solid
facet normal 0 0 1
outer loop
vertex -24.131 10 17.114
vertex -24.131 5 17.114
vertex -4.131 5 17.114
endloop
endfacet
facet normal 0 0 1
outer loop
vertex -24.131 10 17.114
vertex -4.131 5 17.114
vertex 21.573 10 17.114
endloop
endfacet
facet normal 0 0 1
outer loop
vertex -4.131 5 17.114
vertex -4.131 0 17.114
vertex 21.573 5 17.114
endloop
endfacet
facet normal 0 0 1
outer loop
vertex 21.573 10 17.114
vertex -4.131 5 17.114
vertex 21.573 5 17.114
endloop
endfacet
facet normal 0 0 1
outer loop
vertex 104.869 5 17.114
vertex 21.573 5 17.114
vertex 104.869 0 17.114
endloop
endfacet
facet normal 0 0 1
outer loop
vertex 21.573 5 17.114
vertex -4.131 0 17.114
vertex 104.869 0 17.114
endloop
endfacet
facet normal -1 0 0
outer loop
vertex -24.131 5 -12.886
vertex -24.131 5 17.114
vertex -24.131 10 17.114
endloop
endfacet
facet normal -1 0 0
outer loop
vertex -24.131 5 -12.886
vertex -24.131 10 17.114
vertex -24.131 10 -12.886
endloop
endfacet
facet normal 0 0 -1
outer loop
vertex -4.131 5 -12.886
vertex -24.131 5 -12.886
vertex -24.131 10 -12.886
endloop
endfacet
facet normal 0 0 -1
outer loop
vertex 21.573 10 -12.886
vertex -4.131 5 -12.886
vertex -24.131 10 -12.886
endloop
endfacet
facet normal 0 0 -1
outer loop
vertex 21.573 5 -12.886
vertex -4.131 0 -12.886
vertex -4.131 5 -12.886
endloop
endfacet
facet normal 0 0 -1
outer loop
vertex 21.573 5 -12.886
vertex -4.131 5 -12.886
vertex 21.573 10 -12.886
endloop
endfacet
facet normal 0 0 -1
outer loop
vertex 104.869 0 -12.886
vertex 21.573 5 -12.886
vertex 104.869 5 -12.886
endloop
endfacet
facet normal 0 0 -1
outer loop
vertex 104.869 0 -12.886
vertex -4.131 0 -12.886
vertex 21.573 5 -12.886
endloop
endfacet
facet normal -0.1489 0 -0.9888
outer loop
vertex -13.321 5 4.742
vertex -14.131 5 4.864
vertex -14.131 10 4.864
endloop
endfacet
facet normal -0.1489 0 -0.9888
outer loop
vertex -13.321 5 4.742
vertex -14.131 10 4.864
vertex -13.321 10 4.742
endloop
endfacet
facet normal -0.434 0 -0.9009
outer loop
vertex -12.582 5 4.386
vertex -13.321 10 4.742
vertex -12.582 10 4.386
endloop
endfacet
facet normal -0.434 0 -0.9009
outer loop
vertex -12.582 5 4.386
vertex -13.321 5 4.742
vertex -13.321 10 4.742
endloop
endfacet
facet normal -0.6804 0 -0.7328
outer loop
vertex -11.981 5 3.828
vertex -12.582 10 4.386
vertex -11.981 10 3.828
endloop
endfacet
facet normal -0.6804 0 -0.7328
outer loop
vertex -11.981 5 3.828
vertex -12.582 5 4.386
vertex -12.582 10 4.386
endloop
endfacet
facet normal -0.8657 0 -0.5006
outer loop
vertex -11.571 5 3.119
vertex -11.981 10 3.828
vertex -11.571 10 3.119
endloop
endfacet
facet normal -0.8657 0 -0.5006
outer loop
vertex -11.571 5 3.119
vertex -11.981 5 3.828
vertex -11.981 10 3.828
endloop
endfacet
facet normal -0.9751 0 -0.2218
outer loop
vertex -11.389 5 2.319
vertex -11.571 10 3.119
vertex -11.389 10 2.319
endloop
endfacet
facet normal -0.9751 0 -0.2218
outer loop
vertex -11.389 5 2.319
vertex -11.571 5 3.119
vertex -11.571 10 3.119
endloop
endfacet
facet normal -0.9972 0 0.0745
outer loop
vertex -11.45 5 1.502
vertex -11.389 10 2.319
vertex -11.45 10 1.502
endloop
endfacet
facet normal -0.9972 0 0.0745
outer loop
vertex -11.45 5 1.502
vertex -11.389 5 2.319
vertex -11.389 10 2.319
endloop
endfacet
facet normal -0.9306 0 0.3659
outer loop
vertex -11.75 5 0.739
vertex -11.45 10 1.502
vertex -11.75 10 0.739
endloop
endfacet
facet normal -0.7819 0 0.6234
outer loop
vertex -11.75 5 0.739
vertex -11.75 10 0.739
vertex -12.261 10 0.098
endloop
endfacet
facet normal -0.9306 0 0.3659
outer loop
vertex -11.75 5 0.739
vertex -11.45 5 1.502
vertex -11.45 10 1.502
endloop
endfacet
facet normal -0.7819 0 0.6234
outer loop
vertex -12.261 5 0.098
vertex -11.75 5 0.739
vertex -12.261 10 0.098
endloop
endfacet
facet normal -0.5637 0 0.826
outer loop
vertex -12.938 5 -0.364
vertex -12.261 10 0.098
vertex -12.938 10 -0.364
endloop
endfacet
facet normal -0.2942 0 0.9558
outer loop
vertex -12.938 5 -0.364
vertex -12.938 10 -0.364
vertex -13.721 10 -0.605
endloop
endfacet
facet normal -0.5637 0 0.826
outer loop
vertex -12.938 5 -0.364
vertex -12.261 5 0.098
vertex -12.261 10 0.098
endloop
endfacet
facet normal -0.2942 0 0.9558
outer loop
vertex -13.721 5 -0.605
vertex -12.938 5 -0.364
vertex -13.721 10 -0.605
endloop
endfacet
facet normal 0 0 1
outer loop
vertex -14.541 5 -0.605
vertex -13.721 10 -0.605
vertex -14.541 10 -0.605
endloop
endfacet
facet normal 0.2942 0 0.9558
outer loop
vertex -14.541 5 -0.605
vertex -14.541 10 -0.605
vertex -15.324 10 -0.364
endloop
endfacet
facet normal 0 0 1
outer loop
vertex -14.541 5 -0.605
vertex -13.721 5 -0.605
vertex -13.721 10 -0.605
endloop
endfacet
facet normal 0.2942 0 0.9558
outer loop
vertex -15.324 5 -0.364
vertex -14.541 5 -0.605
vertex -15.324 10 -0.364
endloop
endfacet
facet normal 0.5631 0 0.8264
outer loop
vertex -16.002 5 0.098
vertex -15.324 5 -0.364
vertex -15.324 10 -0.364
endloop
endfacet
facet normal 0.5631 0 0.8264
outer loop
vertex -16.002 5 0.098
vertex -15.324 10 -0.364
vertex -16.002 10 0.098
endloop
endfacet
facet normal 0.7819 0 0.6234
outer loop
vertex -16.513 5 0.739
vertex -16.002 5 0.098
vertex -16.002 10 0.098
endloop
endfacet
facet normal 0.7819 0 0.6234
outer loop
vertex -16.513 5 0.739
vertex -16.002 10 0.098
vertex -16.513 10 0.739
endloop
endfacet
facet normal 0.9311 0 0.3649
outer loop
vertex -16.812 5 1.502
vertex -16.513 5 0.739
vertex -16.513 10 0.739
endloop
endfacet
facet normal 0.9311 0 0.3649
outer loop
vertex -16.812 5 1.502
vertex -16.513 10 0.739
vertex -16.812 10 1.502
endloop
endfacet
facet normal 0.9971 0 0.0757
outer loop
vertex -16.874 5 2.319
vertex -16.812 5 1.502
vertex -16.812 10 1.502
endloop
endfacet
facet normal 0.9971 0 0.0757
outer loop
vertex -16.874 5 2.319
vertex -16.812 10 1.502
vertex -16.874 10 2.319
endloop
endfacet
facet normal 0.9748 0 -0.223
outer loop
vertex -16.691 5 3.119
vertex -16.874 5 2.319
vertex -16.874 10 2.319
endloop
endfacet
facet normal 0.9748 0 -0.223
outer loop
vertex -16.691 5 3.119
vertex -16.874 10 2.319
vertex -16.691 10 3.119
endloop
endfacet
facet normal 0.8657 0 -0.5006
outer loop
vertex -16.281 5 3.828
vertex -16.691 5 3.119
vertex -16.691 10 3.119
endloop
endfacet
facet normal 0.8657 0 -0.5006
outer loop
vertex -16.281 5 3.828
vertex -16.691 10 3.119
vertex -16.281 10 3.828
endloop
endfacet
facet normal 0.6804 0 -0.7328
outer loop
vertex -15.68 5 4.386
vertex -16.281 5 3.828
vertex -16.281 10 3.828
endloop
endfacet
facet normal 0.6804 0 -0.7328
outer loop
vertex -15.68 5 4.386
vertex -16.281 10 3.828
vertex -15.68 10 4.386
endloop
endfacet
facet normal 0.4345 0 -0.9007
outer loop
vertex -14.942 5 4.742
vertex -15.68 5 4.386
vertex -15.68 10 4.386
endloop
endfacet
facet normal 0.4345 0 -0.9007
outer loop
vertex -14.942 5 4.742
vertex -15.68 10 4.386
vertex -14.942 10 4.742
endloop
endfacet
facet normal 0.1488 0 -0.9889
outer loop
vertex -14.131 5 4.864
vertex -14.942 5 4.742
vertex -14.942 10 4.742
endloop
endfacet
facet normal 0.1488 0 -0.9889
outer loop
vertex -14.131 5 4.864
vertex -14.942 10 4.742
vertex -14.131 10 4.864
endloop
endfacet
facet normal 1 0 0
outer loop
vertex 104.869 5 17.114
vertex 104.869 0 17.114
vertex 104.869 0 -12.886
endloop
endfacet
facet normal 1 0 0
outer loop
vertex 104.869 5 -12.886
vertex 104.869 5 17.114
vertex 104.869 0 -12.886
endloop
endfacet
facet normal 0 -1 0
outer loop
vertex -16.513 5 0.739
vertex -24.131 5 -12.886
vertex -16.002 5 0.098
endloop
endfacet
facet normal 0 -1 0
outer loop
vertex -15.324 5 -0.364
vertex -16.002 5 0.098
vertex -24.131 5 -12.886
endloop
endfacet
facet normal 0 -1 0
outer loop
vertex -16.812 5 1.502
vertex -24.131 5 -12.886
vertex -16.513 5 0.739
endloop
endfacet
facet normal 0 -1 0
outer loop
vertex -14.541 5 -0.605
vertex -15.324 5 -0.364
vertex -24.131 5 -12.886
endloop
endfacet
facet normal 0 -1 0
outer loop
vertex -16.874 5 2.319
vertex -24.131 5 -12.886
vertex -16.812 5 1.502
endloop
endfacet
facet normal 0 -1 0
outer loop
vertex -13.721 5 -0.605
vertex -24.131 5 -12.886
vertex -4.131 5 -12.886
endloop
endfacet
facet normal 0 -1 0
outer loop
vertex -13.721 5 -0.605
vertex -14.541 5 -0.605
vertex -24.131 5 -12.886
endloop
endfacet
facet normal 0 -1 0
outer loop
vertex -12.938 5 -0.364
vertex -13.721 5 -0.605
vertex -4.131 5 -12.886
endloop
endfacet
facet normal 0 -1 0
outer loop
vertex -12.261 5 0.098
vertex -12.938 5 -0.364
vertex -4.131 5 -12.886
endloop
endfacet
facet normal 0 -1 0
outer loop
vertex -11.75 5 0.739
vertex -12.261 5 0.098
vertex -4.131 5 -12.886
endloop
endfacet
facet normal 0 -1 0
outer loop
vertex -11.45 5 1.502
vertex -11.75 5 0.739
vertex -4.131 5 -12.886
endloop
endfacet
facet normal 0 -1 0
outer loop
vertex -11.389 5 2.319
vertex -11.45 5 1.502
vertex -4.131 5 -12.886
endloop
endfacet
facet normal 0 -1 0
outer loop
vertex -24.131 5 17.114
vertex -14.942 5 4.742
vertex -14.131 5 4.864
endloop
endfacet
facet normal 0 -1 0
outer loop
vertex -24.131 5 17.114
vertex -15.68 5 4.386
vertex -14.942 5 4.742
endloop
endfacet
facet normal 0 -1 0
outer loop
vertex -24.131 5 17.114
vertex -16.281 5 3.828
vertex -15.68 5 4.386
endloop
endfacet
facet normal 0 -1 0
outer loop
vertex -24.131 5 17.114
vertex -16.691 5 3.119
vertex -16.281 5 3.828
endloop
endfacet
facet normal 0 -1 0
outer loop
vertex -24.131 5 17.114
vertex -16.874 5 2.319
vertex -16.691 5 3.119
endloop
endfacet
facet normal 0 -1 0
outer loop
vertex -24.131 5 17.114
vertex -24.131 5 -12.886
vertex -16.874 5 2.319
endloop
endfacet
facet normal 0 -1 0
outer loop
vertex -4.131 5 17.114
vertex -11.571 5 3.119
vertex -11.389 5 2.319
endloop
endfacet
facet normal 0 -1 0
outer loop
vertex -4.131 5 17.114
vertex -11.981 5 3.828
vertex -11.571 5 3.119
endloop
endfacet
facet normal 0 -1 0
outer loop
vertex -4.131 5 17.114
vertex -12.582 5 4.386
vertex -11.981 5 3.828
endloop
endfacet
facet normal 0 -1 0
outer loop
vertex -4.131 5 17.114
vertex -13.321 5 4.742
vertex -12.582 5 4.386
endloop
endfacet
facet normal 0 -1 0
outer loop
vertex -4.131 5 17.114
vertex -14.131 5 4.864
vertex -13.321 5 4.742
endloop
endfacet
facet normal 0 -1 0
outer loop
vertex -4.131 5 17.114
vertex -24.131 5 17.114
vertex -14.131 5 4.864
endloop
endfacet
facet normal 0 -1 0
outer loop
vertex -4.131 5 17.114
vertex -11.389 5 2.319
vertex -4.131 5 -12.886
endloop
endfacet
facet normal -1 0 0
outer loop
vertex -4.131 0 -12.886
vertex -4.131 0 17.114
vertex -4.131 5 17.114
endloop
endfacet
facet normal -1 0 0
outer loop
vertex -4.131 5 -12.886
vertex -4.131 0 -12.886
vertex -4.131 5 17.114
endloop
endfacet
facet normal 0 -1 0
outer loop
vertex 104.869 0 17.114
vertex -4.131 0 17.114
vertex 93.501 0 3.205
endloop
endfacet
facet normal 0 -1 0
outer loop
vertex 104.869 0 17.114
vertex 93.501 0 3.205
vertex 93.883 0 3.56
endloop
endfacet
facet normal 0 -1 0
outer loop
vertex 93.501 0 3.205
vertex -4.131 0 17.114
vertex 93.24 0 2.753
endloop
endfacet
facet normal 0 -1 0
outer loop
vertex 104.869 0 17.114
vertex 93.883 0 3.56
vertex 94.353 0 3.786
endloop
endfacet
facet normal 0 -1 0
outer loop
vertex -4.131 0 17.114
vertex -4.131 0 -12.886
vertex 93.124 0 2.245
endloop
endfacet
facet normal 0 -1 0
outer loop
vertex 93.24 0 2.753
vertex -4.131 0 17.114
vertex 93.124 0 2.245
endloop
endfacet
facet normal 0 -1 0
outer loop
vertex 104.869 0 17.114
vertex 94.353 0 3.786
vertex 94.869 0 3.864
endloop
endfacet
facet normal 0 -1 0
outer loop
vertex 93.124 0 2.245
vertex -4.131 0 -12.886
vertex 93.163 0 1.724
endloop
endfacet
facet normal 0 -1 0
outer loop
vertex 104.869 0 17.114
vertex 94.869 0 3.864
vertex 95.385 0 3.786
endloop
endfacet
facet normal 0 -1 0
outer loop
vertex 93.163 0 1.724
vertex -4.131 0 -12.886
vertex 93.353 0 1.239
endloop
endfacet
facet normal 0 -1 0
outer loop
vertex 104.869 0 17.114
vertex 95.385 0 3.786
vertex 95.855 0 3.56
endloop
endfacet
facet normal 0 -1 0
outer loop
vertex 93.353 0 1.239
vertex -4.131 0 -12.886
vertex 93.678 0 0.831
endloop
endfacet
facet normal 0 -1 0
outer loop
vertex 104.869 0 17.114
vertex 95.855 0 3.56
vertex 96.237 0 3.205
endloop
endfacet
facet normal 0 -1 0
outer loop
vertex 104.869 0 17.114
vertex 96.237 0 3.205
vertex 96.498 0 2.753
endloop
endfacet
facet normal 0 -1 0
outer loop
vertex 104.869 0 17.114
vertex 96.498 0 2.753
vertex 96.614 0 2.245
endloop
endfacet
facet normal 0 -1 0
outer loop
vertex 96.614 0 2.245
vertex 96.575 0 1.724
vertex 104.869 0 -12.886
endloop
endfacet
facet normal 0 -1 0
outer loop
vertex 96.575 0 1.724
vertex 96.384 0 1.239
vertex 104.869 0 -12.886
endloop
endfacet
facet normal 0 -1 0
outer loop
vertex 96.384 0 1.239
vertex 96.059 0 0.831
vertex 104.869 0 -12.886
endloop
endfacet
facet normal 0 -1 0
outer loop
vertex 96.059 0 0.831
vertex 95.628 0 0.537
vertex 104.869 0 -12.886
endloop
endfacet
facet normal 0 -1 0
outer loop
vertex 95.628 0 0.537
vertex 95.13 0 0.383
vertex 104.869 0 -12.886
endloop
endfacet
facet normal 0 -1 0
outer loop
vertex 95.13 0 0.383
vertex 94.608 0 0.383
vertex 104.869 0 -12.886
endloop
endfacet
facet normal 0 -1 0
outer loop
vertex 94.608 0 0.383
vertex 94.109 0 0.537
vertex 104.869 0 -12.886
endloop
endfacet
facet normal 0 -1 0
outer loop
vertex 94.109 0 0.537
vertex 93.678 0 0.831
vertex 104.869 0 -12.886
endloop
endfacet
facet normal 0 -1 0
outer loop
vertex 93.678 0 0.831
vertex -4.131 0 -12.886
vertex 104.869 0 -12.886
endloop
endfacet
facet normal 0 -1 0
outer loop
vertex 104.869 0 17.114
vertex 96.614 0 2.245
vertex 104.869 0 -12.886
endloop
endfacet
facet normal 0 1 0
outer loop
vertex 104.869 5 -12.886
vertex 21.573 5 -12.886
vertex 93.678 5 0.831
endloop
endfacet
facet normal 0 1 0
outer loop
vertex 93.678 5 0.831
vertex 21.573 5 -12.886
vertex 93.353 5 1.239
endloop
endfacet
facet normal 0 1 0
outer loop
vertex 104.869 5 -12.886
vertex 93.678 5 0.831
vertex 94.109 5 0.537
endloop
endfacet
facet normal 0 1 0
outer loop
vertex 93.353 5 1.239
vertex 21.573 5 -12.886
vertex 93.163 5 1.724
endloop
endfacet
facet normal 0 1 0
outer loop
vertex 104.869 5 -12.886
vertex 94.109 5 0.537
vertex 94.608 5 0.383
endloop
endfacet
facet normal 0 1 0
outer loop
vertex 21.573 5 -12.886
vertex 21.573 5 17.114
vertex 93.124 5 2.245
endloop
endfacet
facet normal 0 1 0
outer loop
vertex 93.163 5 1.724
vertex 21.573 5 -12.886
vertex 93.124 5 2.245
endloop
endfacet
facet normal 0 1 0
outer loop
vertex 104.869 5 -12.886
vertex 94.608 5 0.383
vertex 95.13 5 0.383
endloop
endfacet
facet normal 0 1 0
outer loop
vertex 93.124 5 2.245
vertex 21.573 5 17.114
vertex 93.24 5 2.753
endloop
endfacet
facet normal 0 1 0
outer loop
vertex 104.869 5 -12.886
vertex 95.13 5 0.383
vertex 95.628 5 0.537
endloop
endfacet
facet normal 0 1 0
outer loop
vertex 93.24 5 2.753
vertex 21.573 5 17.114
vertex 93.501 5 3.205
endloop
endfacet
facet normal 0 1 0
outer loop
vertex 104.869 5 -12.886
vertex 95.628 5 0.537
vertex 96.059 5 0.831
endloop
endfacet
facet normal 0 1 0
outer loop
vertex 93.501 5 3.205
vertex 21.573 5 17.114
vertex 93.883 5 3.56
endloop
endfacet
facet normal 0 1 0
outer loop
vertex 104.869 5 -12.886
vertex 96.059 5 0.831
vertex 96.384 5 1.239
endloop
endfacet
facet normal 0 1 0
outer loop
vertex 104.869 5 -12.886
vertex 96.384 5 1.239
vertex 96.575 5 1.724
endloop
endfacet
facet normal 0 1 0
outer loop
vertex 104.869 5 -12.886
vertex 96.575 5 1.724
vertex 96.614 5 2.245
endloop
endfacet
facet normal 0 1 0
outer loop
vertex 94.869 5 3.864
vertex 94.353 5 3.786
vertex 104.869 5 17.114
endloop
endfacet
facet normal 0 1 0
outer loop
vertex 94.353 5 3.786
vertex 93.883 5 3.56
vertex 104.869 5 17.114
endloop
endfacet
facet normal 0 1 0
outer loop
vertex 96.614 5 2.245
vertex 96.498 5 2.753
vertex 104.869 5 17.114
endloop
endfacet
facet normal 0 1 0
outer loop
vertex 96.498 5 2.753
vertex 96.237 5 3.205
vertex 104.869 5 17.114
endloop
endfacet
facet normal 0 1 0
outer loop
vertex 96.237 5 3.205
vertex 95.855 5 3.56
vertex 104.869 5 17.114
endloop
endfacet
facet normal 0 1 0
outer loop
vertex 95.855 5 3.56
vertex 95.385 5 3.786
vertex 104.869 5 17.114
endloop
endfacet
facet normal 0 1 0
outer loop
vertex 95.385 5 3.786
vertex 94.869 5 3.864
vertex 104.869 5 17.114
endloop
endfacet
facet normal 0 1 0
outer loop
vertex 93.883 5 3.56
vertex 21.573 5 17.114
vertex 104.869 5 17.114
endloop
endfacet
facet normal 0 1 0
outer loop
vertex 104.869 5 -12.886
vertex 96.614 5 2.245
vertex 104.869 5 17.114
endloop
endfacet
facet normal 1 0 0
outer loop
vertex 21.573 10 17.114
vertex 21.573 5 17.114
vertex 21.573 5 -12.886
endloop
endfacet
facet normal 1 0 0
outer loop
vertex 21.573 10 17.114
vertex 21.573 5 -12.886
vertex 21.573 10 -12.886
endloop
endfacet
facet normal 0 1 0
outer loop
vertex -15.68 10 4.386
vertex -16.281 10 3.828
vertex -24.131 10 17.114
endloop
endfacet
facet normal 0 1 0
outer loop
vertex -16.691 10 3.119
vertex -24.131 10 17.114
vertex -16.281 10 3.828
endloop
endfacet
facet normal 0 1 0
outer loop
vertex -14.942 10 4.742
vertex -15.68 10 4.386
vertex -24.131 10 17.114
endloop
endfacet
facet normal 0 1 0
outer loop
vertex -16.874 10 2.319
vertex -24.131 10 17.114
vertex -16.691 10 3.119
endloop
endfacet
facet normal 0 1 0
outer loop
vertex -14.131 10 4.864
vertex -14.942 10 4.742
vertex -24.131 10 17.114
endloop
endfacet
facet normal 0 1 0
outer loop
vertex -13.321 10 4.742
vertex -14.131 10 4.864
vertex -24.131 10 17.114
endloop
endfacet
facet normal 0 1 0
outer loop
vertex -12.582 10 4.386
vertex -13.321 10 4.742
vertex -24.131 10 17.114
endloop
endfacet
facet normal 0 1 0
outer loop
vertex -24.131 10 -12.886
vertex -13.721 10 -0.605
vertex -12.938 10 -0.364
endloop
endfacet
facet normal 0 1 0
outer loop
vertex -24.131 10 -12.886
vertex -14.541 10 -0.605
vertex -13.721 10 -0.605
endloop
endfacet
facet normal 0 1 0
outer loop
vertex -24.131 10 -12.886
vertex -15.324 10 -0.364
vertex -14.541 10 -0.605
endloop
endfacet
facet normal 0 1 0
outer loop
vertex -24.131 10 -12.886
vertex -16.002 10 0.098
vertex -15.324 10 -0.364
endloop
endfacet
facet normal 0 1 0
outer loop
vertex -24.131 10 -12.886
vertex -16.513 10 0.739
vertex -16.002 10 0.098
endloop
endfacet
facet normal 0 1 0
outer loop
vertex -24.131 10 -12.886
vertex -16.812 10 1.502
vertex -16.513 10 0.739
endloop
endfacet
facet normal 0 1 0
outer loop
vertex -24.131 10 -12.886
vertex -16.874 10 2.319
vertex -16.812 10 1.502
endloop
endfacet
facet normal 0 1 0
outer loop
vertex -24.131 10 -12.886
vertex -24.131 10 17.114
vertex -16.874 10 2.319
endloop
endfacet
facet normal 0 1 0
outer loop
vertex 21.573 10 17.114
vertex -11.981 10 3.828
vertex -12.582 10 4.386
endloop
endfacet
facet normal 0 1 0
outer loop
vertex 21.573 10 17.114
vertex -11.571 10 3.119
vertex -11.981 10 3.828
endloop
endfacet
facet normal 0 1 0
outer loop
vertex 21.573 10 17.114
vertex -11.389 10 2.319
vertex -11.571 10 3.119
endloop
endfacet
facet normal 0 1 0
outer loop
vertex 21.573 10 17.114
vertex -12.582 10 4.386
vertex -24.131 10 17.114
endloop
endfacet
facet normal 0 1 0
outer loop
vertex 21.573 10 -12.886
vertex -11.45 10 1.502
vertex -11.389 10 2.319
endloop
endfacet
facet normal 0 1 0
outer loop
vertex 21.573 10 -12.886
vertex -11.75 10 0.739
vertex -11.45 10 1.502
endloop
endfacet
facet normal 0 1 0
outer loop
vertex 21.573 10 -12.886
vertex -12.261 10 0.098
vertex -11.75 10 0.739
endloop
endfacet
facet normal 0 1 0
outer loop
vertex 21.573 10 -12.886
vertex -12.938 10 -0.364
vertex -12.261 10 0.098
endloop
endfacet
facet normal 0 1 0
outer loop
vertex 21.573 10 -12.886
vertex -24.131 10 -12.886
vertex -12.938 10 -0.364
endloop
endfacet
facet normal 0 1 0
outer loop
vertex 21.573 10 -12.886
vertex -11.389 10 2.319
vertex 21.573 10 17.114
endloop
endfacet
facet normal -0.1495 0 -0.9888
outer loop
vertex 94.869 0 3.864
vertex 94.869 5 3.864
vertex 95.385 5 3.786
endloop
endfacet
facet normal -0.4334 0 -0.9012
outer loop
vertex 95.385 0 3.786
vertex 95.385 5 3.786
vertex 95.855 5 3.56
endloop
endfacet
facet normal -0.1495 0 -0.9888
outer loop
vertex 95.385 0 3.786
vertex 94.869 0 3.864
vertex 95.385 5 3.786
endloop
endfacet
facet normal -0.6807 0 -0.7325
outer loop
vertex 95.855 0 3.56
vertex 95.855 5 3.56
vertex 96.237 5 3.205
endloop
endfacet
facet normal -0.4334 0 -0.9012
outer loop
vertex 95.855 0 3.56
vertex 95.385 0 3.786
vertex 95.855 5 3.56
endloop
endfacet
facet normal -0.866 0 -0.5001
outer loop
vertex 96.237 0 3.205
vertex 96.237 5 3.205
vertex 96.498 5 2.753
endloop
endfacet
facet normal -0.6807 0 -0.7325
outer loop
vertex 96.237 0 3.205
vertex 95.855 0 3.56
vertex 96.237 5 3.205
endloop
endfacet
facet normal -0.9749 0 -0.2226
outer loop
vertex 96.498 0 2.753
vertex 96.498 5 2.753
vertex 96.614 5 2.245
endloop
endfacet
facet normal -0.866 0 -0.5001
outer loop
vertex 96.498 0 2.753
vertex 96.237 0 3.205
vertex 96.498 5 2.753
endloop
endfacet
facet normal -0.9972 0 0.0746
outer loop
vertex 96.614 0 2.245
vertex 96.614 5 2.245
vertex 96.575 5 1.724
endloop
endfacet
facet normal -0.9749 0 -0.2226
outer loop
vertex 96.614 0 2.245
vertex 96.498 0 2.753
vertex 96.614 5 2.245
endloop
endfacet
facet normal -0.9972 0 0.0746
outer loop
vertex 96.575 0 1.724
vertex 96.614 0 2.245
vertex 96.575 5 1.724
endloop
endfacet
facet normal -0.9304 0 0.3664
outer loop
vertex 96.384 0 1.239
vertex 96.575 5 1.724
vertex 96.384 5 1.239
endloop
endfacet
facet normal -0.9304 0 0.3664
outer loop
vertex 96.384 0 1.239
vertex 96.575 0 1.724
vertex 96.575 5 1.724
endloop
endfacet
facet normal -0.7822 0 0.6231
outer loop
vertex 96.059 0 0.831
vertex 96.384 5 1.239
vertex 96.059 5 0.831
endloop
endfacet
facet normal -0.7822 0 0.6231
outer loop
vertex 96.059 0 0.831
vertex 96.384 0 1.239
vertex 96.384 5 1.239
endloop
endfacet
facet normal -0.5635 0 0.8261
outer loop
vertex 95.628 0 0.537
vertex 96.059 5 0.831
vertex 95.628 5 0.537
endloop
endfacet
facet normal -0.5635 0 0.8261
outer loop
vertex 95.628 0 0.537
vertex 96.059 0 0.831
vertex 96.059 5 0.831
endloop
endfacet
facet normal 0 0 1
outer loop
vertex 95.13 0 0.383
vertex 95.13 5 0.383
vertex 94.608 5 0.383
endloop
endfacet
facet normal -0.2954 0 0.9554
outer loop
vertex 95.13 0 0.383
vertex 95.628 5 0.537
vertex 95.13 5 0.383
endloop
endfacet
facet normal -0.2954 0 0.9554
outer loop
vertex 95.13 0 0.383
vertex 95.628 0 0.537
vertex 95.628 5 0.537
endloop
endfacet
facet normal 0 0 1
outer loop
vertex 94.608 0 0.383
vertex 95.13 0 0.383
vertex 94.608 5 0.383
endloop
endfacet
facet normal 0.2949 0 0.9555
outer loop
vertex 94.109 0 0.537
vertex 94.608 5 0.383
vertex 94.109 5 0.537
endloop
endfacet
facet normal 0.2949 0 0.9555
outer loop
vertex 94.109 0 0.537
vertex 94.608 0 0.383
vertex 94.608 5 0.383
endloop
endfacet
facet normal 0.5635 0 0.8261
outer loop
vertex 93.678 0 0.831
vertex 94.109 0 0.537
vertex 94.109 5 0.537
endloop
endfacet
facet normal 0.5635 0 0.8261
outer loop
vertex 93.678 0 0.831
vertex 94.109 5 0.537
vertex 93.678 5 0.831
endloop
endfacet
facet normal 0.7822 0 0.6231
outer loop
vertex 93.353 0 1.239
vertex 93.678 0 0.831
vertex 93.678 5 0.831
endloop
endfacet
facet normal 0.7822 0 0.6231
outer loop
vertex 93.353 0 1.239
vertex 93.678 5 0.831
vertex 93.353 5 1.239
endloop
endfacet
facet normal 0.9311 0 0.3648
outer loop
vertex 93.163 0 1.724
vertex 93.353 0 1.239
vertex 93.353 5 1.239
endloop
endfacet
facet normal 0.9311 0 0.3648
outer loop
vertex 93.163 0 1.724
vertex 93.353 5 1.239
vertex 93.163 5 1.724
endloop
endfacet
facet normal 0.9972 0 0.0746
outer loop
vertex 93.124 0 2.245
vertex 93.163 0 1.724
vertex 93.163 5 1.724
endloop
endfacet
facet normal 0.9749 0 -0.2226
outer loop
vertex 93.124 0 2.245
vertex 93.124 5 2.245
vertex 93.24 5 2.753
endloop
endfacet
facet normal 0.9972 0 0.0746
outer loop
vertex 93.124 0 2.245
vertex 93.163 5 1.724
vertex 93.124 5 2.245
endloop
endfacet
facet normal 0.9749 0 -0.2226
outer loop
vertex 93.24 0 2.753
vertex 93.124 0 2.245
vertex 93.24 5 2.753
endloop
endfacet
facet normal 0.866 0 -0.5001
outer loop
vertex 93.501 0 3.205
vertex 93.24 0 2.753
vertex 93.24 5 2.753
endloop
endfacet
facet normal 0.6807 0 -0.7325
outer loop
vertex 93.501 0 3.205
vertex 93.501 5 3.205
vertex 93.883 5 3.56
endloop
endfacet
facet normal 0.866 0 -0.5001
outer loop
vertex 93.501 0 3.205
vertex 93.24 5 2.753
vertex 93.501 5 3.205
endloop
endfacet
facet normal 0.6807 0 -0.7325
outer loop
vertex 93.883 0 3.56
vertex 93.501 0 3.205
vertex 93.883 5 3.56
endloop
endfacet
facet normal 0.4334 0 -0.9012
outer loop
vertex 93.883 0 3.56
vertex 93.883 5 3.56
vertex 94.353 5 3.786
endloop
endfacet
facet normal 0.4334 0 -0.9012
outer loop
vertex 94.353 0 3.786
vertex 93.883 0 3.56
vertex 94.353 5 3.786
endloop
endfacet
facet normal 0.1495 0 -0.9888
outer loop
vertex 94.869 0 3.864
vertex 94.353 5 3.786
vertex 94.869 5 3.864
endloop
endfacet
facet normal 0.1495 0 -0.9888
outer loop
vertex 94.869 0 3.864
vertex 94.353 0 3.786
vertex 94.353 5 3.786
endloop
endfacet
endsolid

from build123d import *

# Parameters (mm, degrees)
SKETCH_1_W          = 129
SKETCH_1_H          = 30
SKETCH_1_R          = 2.75
SKETCH_1_R_2        = 1.75
EXTRUDE_1_DEPTH     = 10
SKETCH_2_W          = 20
SKETCH_2_H          = 5
SKETCH_2_W_2        = 83.295582585
CUT_EXTRUDE_1_DEPTH = 110.532870251


with BuildPart() as part:
    # 草图1 → 凸台-拉伸1 (new body)
    with BuildSketch(Plane(origin=(0, 0, 0), x_dir=(1, 0, 0), z_dir=(0, 1, 0))):
        with Locations((40.368725869, -2.113899614)):
            Rectangle(SKETCH_1_W, SKETCH_1_H)
        with Locations(Location((-14.131274131, -2.113899614, 0), (0, 0, 270))):
            Circle(SKETCH_1_R, mode=Mode.SUBTRACT)
        with Locations(Location((94.868725869, -2.113899614, 0), (0, 0, 270))):
            Circle(SKETCH_1_R_2, mode=Mode.SUBTRACT)
    extrude(amount=EXTRUDE_1_DEPTH)

    # 草图2 → 切除-拉伸1 (cut, through all)
    with BuildSketch(Plane.XY.offset(17.113899614)):
        with Locations((-14.131274131, 2.5)):
            Rectangle(SKETCH_2_W, SKETCH_2_H)
        with Locations((63.220934576, 7.5)):
            Rectangle(SKETCH_2_W_2, SKETCH_2_H)
    extrude(amount=-CUT_EXTRUDE_1_DEPTH, mode=Mode.SUBTRACT)


solid = part.part
